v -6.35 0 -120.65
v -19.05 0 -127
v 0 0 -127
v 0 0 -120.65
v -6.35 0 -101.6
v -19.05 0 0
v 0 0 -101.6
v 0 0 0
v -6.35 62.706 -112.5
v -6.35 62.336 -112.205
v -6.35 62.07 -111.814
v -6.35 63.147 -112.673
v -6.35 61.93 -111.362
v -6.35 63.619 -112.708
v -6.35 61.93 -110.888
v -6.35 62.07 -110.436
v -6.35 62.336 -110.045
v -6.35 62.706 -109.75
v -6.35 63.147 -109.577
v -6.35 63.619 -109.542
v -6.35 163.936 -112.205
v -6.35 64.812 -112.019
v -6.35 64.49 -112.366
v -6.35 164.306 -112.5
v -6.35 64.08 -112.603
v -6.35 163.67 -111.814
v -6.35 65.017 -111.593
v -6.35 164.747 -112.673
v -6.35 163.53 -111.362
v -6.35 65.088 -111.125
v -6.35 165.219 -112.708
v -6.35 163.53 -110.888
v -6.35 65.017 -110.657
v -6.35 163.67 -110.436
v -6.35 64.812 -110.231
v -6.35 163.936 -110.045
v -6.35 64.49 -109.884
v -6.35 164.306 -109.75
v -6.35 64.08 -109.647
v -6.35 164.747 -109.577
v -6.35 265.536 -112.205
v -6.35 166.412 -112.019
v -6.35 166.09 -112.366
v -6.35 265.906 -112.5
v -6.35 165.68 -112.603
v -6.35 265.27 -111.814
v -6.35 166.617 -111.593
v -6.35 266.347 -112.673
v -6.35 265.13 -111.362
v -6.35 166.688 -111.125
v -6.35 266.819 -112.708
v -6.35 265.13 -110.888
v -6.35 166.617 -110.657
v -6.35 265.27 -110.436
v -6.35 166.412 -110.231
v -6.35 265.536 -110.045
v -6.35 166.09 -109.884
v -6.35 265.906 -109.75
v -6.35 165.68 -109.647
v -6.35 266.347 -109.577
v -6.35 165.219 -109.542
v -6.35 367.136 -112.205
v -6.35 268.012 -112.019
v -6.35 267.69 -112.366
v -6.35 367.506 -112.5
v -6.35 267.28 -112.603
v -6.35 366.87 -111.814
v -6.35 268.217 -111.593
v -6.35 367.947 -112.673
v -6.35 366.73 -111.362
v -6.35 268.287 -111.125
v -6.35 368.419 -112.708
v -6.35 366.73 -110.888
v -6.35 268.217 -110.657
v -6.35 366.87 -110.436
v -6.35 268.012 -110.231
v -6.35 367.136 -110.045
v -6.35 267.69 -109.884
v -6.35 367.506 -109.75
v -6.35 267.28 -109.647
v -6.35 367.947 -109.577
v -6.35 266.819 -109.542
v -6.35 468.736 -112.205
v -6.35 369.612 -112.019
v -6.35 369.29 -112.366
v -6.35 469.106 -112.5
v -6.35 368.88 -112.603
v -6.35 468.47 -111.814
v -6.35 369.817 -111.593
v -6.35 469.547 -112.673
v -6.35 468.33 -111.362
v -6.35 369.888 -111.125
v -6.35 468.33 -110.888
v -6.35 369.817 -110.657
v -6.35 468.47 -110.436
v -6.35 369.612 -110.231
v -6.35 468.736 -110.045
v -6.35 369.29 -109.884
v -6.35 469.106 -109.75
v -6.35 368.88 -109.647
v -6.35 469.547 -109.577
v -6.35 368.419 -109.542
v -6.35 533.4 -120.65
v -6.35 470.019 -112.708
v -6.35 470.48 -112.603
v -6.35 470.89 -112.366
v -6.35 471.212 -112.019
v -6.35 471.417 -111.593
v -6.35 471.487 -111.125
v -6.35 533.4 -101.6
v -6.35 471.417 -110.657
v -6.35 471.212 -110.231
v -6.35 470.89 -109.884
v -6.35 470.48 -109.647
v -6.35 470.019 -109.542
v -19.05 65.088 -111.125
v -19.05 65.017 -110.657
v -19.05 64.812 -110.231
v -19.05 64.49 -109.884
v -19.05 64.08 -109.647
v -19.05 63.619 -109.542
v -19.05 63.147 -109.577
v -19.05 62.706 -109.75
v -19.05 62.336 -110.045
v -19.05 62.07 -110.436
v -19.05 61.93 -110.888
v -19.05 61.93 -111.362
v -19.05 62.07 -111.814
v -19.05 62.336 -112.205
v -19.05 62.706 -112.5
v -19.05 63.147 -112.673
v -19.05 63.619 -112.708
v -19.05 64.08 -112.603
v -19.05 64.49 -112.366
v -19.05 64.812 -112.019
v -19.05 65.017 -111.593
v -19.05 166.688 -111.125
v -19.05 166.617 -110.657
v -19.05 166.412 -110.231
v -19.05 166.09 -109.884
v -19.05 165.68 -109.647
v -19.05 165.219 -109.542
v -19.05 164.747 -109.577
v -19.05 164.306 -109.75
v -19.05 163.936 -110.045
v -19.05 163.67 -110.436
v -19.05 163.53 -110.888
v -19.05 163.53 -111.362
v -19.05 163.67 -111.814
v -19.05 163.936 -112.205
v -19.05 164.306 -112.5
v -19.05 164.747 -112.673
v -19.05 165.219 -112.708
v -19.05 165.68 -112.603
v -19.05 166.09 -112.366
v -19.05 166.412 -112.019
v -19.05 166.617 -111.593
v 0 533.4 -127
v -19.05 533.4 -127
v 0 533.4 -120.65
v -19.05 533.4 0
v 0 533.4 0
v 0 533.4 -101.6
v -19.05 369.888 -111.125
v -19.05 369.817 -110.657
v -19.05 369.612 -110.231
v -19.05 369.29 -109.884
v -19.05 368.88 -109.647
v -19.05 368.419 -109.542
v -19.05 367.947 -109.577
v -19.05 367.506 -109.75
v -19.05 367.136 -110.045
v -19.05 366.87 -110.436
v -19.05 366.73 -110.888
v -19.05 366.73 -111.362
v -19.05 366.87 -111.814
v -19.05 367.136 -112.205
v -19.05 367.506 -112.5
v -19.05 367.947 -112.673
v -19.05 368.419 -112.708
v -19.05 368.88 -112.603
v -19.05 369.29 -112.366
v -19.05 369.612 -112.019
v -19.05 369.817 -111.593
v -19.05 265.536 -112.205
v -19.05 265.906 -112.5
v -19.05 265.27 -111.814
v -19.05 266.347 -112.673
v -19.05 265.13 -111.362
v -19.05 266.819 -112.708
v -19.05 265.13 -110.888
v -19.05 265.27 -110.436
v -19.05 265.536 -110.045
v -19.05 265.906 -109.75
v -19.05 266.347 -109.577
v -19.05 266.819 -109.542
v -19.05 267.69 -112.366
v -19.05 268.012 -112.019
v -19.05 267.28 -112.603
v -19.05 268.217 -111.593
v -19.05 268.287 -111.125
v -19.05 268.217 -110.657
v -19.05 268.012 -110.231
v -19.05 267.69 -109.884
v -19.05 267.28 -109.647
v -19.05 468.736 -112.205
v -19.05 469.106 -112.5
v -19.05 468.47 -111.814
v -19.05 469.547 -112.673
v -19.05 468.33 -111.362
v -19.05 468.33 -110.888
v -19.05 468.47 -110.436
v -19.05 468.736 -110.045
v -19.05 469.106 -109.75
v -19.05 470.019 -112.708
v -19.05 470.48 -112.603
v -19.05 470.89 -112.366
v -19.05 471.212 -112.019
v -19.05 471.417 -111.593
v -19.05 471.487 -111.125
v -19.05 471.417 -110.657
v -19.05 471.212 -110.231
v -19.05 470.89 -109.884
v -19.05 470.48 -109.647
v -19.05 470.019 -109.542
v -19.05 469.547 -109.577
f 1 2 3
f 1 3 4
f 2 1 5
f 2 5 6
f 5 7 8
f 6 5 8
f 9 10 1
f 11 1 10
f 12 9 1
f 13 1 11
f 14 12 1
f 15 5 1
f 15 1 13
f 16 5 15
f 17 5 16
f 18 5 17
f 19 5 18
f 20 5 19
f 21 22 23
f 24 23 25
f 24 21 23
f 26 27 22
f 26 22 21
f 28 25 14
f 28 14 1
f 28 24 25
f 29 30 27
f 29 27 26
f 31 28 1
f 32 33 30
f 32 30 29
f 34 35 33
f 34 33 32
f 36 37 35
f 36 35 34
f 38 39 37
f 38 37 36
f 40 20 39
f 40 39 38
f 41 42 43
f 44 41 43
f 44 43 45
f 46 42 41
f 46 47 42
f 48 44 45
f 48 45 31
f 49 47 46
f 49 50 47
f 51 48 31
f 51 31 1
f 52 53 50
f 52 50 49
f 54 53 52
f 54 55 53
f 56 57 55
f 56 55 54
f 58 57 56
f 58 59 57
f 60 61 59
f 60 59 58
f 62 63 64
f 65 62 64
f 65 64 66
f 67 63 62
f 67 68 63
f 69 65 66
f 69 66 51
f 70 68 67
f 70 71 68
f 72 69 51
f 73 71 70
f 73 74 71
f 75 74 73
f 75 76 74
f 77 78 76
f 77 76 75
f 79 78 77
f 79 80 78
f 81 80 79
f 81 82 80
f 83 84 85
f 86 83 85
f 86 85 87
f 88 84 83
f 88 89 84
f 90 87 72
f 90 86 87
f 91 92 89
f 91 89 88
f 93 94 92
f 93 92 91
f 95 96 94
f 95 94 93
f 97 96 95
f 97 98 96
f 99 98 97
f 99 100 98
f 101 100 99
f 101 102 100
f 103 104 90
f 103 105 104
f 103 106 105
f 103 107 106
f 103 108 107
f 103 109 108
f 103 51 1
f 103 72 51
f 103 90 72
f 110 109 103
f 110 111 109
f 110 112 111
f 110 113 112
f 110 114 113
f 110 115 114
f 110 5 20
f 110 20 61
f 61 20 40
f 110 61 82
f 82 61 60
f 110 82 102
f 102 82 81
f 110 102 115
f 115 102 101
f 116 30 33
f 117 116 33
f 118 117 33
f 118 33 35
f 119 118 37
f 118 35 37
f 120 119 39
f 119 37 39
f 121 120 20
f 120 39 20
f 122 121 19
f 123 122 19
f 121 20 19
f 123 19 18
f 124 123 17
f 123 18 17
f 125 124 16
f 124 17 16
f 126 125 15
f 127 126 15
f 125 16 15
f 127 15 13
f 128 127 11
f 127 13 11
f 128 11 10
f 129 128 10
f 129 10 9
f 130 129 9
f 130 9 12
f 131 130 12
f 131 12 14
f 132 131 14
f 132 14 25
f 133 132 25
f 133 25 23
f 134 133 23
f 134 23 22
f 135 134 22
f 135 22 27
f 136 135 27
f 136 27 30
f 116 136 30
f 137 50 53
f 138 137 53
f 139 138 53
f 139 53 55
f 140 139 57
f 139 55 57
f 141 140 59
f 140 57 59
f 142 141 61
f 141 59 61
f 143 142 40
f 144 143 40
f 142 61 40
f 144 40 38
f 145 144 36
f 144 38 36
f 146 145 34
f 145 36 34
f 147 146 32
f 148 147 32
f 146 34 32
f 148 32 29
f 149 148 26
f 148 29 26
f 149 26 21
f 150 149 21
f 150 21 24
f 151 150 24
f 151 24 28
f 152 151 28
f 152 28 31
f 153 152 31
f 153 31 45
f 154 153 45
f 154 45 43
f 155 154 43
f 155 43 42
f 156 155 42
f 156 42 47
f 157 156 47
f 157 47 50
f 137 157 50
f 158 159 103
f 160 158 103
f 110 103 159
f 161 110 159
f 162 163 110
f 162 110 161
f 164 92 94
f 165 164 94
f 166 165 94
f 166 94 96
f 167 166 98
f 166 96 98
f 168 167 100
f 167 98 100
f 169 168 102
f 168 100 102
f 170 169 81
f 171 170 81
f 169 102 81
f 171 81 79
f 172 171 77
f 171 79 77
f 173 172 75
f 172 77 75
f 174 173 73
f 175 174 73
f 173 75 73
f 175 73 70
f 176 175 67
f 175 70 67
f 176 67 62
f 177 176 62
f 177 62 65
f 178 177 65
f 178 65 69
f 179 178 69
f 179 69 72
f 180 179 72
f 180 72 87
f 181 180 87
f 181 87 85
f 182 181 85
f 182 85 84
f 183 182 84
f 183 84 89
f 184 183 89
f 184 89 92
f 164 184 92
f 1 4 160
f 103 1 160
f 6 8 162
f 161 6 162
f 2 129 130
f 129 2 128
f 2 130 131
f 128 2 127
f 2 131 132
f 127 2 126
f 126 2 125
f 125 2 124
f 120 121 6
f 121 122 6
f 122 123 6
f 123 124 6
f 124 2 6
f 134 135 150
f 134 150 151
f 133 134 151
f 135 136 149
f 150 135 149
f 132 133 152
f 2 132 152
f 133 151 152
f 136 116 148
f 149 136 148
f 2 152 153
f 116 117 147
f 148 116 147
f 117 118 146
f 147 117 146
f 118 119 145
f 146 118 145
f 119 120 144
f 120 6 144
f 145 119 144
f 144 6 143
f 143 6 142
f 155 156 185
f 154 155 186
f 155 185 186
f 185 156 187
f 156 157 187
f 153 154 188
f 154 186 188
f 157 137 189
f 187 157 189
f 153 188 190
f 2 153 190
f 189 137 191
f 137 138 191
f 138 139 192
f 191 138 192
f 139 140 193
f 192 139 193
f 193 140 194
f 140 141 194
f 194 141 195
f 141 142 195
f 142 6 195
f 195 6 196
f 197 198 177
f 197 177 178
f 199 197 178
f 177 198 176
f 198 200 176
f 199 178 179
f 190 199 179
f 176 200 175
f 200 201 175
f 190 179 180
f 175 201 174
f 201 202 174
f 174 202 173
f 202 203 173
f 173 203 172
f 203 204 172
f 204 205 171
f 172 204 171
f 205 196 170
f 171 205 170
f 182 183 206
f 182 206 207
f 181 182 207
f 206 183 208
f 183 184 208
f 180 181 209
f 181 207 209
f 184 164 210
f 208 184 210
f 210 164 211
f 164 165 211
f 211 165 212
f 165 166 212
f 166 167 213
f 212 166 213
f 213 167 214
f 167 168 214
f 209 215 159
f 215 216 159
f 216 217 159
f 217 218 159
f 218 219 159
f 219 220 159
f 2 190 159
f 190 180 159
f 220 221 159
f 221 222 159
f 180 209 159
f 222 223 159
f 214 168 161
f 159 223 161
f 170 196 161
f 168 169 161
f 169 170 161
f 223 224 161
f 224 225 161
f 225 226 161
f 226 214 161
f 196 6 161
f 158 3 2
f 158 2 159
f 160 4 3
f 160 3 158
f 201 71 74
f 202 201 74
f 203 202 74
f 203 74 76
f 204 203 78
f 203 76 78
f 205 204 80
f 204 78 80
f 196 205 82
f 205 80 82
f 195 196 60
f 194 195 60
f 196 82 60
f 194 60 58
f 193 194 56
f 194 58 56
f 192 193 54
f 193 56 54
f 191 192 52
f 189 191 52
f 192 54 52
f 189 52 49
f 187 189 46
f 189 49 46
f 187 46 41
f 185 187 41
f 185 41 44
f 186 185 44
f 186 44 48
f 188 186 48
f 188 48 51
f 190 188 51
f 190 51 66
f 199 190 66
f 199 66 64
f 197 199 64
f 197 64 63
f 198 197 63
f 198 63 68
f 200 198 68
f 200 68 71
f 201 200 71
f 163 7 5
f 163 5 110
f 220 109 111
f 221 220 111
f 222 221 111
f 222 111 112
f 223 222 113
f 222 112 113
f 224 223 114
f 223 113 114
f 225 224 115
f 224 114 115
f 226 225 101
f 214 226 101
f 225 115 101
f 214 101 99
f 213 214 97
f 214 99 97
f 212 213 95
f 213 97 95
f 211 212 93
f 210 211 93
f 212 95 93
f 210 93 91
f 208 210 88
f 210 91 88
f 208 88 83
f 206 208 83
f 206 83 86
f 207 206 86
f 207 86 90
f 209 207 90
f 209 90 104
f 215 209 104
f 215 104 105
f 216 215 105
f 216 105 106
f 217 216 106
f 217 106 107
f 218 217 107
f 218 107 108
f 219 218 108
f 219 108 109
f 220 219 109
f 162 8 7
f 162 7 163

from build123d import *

# Parameters (mm, degrees)
F0_W     = 533.4
F0_H     = 127
F1_DEPTH = 19.05
F2_W     = 533.4
F2_H     = 19.05
F3_DEPTH = 6.35
F4_R     = 1.5875
F5_DEPTH = 19.051


with BuildPart() as f1:
    # F0 (on Right) → F1 (new body)
    with BuildSketch(Plane.YZ):
        with Locations((266.7, -63.5)):
            Rectangle(F0_W, F0_H)
    extrude(amount=-F1_DEPTH)

    # F2 (on Right) → F3 (cut)
    with BuildSketch(Plane.YZ):
        with Locations((266.7, -111.125)):
            Rectangle(F2_W, F2_H)
    extrude(amount=-F3_DEPTH, mode=Mode.SUBTRACT)

    # F4 (on Right) → F5 (cut, through all)
    with BuildSketch(Plane.YZ):
        with Locations((63.5, -111.125)):
            Circle(F4_R)
        with Locations((165.1, -111.125)):
            Circle(F4_R)
        with Locations((266.7, -111.125)):
            Circle(F4_R)
        with Locations((368.3, -111.125)):
            Circle(F4_R)
        with Locations((469.9, -111.125)):
            Circle(F4_R)
    extrude(amount=-F5_DEPTH, mode=Mode.SUBTRACT)


solid = f1.part
